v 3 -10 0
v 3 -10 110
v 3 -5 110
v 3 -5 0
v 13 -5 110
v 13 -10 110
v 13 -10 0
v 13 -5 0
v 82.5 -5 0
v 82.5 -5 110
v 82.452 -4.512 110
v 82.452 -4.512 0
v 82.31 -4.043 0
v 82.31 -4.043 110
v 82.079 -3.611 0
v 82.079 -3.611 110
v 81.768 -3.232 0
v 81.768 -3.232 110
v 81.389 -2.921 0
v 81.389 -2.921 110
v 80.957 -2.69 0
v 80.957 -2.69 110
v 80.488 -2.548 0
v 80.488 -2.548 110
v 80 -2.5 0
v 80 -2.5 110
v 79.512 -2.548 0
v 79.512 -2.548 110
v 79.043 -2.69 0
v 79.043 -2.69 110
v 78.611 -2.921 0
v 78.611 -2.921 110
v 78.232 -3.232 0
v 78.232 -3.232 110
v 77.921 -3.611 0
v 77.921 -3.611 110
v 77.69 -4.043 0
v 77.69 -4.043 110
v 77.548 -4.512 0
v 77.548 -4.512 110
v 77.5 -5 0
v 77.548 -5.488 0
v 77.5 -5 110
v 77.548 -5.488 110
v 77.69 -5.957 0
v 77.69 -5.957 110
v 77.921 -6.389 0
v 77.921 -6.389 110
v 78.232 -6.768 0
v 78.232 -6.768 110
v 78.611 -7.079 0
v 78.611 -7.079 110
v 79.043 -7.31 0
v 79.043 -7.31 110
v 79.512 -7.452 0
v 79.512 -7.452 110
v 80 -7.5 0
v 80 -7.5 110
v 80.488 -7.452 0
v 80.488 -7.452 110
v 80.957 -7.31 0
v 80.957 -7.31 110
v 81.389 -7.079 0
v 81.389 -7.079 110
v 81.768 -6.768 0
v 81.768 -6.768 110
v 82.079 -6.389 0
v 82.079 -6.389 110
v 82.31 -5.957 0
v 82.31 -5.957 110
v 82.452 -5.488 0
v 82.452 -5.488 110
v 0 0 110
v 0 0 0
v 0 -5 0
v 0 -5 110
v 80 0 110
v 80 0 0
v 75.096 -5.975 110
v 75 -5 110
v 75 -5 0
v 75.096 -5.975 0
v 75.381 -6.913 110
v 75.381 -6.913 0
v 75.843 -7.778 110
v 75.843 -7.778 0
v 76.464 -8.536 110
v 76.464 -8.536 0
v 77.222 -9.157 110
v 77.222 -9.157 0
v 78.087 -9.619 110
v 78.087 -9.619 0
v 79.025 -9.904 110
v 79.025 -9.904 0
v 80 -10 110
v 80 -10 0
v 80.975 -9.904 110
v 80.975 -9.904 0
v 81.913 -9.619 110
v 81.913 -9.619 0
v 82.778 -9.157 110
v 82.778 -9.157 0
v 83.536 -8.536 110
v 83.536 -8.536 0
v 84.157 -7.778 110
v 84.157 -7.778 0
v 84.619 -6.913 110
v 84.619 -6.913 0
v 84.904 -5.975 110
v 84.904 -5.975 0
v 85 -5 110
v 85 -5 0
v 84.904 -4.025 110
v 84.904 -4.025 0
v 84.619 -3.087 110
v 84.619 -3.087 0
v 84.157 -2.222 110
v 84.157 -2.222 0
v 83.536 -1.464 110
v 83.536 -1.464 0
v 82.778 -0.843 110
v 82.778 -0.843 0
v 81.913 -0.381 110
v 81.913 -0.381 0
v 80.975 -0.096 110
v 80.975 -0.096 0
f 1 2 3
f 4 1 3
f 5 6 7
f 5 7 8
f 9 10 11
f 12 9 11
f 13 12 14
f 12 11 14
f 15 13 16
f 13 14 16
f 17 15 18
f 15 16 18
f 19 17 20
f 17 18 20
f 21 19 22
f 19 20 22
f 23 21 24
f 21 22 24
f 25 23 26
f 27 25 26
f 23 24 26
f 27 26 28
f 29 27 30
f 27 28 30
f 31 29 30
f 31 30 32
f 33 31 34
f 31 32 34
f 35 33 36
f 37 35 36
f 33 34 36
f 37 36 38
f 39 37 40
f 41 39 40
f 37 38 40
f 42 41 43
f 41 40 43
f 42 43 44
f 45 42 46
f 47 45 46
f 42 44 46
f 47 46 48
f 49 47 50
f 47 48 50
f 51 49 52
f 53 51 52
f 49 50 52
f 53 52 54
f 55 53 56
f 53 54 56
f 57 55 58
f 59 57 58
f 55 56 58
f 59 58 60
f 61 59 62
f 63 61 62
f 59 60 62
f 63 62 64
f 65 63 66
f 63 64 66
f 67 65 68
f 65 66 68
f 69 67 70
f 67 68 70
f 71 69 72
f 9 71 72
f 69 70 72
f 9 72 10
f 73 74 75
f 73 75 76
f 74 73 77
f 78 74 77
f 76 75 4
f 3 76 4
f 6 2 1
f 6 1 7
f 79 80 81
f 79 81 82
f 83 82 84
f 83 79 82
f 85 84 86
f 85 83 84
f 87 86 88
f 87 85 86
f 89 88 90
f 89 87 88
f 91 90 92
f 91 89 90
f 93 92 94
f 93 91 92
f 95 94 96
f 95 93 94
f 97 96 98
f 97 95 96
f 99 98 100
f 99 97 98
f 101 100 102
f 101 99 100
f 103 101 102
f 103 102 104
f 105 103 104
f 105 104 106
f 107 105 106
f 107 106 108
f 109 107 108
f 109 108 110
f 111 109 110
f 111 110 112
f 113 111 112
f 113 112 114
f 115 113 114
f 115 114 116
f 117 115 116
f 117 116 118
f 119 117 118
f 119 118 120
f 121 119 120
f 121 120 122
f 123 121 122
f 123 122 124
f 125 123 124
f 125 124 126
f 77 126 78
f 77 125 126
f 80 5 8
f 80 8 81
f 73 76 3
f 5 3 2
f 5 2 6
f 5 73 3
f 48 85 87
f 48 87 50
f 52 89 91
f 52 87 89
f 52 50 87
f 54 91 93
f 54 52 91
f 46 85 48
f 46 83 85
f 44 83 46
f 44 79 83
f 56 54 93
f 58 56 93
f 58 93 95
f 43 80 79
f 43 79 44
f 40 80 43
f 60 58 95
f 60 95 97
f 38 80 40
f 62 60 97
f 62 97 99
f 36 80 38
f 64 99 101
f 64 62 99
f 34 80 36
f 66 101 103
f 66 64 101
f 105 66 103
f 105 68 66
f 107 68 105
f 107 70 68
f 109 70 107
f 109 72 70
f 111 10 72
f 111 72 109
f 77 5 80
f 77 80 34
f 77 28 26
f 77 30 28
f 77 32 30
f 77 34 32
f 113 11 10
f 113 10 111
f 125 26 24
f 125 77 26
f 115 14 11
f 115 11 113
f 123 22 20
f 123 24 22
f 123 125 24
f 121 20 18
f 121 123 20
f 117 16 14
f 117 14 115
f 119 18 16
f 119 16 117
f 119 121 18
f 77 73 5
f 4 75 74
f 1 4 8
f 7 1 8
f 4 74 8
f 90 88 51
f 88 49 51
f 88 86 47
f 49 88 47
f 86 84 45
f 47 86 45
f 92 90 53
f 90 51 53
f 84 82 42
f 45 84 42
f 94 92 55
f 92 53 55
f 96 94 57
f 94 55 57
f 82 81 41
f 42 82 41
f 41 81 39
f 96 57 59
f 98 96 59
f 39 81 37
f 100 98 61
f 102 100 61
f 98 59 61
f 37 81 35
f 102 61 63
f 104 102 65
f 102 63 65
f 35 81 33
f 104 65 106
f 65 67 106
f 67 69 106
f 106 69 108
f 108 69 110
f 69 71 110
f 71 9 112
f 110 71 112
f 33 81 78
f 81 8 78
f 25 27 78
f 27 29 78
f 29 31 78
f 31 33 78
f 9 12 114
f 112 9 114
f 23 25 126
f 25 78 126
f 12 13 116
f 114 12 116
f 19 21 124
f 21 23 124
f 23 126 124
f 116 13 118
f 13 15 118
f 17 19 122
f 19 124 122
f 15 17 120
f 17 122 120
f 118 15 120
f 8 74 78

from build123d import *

# Parameters (mm, degrees)
F0_W     = 80
F0_H     = 110
F1_DEPTH = 5
F2_R     = 5
F2_W     = 10
F2_H     = 5
F3_DEPTH = 110
F4_R     = 2.5
F5_DEPTH = 110


with BuildPart() as f1:
    # F0 (on Front) → F1 (new body)
    with BuildSketch(Plane.XZ):
        with Locations((40, 55)):
            Rectangle(F0_W, F0_H)
    extrude(amount=F1_DEPTH)

    # F2 (on face) → F3 (join, through all)
    with BuildSketch(Plane.XY.offset(110)):
        with Locations((80, -5)):
            Circle(F2_R)
        with Locations((8, -7.5)):
            Rectangle(F2_W, F2_H)
    extrude(amount=-F3_DEPTH)

    # F4 (on face) → F5 (cut, through all)
    with BuildSketch(Plane.XY.offset(110)):
        with Locations((80, -5)):
            Circle(F4_R)
    extrude(amount=-F5_DEPTH, mode=Mode.SUBTRACT)


solid = f1.part
